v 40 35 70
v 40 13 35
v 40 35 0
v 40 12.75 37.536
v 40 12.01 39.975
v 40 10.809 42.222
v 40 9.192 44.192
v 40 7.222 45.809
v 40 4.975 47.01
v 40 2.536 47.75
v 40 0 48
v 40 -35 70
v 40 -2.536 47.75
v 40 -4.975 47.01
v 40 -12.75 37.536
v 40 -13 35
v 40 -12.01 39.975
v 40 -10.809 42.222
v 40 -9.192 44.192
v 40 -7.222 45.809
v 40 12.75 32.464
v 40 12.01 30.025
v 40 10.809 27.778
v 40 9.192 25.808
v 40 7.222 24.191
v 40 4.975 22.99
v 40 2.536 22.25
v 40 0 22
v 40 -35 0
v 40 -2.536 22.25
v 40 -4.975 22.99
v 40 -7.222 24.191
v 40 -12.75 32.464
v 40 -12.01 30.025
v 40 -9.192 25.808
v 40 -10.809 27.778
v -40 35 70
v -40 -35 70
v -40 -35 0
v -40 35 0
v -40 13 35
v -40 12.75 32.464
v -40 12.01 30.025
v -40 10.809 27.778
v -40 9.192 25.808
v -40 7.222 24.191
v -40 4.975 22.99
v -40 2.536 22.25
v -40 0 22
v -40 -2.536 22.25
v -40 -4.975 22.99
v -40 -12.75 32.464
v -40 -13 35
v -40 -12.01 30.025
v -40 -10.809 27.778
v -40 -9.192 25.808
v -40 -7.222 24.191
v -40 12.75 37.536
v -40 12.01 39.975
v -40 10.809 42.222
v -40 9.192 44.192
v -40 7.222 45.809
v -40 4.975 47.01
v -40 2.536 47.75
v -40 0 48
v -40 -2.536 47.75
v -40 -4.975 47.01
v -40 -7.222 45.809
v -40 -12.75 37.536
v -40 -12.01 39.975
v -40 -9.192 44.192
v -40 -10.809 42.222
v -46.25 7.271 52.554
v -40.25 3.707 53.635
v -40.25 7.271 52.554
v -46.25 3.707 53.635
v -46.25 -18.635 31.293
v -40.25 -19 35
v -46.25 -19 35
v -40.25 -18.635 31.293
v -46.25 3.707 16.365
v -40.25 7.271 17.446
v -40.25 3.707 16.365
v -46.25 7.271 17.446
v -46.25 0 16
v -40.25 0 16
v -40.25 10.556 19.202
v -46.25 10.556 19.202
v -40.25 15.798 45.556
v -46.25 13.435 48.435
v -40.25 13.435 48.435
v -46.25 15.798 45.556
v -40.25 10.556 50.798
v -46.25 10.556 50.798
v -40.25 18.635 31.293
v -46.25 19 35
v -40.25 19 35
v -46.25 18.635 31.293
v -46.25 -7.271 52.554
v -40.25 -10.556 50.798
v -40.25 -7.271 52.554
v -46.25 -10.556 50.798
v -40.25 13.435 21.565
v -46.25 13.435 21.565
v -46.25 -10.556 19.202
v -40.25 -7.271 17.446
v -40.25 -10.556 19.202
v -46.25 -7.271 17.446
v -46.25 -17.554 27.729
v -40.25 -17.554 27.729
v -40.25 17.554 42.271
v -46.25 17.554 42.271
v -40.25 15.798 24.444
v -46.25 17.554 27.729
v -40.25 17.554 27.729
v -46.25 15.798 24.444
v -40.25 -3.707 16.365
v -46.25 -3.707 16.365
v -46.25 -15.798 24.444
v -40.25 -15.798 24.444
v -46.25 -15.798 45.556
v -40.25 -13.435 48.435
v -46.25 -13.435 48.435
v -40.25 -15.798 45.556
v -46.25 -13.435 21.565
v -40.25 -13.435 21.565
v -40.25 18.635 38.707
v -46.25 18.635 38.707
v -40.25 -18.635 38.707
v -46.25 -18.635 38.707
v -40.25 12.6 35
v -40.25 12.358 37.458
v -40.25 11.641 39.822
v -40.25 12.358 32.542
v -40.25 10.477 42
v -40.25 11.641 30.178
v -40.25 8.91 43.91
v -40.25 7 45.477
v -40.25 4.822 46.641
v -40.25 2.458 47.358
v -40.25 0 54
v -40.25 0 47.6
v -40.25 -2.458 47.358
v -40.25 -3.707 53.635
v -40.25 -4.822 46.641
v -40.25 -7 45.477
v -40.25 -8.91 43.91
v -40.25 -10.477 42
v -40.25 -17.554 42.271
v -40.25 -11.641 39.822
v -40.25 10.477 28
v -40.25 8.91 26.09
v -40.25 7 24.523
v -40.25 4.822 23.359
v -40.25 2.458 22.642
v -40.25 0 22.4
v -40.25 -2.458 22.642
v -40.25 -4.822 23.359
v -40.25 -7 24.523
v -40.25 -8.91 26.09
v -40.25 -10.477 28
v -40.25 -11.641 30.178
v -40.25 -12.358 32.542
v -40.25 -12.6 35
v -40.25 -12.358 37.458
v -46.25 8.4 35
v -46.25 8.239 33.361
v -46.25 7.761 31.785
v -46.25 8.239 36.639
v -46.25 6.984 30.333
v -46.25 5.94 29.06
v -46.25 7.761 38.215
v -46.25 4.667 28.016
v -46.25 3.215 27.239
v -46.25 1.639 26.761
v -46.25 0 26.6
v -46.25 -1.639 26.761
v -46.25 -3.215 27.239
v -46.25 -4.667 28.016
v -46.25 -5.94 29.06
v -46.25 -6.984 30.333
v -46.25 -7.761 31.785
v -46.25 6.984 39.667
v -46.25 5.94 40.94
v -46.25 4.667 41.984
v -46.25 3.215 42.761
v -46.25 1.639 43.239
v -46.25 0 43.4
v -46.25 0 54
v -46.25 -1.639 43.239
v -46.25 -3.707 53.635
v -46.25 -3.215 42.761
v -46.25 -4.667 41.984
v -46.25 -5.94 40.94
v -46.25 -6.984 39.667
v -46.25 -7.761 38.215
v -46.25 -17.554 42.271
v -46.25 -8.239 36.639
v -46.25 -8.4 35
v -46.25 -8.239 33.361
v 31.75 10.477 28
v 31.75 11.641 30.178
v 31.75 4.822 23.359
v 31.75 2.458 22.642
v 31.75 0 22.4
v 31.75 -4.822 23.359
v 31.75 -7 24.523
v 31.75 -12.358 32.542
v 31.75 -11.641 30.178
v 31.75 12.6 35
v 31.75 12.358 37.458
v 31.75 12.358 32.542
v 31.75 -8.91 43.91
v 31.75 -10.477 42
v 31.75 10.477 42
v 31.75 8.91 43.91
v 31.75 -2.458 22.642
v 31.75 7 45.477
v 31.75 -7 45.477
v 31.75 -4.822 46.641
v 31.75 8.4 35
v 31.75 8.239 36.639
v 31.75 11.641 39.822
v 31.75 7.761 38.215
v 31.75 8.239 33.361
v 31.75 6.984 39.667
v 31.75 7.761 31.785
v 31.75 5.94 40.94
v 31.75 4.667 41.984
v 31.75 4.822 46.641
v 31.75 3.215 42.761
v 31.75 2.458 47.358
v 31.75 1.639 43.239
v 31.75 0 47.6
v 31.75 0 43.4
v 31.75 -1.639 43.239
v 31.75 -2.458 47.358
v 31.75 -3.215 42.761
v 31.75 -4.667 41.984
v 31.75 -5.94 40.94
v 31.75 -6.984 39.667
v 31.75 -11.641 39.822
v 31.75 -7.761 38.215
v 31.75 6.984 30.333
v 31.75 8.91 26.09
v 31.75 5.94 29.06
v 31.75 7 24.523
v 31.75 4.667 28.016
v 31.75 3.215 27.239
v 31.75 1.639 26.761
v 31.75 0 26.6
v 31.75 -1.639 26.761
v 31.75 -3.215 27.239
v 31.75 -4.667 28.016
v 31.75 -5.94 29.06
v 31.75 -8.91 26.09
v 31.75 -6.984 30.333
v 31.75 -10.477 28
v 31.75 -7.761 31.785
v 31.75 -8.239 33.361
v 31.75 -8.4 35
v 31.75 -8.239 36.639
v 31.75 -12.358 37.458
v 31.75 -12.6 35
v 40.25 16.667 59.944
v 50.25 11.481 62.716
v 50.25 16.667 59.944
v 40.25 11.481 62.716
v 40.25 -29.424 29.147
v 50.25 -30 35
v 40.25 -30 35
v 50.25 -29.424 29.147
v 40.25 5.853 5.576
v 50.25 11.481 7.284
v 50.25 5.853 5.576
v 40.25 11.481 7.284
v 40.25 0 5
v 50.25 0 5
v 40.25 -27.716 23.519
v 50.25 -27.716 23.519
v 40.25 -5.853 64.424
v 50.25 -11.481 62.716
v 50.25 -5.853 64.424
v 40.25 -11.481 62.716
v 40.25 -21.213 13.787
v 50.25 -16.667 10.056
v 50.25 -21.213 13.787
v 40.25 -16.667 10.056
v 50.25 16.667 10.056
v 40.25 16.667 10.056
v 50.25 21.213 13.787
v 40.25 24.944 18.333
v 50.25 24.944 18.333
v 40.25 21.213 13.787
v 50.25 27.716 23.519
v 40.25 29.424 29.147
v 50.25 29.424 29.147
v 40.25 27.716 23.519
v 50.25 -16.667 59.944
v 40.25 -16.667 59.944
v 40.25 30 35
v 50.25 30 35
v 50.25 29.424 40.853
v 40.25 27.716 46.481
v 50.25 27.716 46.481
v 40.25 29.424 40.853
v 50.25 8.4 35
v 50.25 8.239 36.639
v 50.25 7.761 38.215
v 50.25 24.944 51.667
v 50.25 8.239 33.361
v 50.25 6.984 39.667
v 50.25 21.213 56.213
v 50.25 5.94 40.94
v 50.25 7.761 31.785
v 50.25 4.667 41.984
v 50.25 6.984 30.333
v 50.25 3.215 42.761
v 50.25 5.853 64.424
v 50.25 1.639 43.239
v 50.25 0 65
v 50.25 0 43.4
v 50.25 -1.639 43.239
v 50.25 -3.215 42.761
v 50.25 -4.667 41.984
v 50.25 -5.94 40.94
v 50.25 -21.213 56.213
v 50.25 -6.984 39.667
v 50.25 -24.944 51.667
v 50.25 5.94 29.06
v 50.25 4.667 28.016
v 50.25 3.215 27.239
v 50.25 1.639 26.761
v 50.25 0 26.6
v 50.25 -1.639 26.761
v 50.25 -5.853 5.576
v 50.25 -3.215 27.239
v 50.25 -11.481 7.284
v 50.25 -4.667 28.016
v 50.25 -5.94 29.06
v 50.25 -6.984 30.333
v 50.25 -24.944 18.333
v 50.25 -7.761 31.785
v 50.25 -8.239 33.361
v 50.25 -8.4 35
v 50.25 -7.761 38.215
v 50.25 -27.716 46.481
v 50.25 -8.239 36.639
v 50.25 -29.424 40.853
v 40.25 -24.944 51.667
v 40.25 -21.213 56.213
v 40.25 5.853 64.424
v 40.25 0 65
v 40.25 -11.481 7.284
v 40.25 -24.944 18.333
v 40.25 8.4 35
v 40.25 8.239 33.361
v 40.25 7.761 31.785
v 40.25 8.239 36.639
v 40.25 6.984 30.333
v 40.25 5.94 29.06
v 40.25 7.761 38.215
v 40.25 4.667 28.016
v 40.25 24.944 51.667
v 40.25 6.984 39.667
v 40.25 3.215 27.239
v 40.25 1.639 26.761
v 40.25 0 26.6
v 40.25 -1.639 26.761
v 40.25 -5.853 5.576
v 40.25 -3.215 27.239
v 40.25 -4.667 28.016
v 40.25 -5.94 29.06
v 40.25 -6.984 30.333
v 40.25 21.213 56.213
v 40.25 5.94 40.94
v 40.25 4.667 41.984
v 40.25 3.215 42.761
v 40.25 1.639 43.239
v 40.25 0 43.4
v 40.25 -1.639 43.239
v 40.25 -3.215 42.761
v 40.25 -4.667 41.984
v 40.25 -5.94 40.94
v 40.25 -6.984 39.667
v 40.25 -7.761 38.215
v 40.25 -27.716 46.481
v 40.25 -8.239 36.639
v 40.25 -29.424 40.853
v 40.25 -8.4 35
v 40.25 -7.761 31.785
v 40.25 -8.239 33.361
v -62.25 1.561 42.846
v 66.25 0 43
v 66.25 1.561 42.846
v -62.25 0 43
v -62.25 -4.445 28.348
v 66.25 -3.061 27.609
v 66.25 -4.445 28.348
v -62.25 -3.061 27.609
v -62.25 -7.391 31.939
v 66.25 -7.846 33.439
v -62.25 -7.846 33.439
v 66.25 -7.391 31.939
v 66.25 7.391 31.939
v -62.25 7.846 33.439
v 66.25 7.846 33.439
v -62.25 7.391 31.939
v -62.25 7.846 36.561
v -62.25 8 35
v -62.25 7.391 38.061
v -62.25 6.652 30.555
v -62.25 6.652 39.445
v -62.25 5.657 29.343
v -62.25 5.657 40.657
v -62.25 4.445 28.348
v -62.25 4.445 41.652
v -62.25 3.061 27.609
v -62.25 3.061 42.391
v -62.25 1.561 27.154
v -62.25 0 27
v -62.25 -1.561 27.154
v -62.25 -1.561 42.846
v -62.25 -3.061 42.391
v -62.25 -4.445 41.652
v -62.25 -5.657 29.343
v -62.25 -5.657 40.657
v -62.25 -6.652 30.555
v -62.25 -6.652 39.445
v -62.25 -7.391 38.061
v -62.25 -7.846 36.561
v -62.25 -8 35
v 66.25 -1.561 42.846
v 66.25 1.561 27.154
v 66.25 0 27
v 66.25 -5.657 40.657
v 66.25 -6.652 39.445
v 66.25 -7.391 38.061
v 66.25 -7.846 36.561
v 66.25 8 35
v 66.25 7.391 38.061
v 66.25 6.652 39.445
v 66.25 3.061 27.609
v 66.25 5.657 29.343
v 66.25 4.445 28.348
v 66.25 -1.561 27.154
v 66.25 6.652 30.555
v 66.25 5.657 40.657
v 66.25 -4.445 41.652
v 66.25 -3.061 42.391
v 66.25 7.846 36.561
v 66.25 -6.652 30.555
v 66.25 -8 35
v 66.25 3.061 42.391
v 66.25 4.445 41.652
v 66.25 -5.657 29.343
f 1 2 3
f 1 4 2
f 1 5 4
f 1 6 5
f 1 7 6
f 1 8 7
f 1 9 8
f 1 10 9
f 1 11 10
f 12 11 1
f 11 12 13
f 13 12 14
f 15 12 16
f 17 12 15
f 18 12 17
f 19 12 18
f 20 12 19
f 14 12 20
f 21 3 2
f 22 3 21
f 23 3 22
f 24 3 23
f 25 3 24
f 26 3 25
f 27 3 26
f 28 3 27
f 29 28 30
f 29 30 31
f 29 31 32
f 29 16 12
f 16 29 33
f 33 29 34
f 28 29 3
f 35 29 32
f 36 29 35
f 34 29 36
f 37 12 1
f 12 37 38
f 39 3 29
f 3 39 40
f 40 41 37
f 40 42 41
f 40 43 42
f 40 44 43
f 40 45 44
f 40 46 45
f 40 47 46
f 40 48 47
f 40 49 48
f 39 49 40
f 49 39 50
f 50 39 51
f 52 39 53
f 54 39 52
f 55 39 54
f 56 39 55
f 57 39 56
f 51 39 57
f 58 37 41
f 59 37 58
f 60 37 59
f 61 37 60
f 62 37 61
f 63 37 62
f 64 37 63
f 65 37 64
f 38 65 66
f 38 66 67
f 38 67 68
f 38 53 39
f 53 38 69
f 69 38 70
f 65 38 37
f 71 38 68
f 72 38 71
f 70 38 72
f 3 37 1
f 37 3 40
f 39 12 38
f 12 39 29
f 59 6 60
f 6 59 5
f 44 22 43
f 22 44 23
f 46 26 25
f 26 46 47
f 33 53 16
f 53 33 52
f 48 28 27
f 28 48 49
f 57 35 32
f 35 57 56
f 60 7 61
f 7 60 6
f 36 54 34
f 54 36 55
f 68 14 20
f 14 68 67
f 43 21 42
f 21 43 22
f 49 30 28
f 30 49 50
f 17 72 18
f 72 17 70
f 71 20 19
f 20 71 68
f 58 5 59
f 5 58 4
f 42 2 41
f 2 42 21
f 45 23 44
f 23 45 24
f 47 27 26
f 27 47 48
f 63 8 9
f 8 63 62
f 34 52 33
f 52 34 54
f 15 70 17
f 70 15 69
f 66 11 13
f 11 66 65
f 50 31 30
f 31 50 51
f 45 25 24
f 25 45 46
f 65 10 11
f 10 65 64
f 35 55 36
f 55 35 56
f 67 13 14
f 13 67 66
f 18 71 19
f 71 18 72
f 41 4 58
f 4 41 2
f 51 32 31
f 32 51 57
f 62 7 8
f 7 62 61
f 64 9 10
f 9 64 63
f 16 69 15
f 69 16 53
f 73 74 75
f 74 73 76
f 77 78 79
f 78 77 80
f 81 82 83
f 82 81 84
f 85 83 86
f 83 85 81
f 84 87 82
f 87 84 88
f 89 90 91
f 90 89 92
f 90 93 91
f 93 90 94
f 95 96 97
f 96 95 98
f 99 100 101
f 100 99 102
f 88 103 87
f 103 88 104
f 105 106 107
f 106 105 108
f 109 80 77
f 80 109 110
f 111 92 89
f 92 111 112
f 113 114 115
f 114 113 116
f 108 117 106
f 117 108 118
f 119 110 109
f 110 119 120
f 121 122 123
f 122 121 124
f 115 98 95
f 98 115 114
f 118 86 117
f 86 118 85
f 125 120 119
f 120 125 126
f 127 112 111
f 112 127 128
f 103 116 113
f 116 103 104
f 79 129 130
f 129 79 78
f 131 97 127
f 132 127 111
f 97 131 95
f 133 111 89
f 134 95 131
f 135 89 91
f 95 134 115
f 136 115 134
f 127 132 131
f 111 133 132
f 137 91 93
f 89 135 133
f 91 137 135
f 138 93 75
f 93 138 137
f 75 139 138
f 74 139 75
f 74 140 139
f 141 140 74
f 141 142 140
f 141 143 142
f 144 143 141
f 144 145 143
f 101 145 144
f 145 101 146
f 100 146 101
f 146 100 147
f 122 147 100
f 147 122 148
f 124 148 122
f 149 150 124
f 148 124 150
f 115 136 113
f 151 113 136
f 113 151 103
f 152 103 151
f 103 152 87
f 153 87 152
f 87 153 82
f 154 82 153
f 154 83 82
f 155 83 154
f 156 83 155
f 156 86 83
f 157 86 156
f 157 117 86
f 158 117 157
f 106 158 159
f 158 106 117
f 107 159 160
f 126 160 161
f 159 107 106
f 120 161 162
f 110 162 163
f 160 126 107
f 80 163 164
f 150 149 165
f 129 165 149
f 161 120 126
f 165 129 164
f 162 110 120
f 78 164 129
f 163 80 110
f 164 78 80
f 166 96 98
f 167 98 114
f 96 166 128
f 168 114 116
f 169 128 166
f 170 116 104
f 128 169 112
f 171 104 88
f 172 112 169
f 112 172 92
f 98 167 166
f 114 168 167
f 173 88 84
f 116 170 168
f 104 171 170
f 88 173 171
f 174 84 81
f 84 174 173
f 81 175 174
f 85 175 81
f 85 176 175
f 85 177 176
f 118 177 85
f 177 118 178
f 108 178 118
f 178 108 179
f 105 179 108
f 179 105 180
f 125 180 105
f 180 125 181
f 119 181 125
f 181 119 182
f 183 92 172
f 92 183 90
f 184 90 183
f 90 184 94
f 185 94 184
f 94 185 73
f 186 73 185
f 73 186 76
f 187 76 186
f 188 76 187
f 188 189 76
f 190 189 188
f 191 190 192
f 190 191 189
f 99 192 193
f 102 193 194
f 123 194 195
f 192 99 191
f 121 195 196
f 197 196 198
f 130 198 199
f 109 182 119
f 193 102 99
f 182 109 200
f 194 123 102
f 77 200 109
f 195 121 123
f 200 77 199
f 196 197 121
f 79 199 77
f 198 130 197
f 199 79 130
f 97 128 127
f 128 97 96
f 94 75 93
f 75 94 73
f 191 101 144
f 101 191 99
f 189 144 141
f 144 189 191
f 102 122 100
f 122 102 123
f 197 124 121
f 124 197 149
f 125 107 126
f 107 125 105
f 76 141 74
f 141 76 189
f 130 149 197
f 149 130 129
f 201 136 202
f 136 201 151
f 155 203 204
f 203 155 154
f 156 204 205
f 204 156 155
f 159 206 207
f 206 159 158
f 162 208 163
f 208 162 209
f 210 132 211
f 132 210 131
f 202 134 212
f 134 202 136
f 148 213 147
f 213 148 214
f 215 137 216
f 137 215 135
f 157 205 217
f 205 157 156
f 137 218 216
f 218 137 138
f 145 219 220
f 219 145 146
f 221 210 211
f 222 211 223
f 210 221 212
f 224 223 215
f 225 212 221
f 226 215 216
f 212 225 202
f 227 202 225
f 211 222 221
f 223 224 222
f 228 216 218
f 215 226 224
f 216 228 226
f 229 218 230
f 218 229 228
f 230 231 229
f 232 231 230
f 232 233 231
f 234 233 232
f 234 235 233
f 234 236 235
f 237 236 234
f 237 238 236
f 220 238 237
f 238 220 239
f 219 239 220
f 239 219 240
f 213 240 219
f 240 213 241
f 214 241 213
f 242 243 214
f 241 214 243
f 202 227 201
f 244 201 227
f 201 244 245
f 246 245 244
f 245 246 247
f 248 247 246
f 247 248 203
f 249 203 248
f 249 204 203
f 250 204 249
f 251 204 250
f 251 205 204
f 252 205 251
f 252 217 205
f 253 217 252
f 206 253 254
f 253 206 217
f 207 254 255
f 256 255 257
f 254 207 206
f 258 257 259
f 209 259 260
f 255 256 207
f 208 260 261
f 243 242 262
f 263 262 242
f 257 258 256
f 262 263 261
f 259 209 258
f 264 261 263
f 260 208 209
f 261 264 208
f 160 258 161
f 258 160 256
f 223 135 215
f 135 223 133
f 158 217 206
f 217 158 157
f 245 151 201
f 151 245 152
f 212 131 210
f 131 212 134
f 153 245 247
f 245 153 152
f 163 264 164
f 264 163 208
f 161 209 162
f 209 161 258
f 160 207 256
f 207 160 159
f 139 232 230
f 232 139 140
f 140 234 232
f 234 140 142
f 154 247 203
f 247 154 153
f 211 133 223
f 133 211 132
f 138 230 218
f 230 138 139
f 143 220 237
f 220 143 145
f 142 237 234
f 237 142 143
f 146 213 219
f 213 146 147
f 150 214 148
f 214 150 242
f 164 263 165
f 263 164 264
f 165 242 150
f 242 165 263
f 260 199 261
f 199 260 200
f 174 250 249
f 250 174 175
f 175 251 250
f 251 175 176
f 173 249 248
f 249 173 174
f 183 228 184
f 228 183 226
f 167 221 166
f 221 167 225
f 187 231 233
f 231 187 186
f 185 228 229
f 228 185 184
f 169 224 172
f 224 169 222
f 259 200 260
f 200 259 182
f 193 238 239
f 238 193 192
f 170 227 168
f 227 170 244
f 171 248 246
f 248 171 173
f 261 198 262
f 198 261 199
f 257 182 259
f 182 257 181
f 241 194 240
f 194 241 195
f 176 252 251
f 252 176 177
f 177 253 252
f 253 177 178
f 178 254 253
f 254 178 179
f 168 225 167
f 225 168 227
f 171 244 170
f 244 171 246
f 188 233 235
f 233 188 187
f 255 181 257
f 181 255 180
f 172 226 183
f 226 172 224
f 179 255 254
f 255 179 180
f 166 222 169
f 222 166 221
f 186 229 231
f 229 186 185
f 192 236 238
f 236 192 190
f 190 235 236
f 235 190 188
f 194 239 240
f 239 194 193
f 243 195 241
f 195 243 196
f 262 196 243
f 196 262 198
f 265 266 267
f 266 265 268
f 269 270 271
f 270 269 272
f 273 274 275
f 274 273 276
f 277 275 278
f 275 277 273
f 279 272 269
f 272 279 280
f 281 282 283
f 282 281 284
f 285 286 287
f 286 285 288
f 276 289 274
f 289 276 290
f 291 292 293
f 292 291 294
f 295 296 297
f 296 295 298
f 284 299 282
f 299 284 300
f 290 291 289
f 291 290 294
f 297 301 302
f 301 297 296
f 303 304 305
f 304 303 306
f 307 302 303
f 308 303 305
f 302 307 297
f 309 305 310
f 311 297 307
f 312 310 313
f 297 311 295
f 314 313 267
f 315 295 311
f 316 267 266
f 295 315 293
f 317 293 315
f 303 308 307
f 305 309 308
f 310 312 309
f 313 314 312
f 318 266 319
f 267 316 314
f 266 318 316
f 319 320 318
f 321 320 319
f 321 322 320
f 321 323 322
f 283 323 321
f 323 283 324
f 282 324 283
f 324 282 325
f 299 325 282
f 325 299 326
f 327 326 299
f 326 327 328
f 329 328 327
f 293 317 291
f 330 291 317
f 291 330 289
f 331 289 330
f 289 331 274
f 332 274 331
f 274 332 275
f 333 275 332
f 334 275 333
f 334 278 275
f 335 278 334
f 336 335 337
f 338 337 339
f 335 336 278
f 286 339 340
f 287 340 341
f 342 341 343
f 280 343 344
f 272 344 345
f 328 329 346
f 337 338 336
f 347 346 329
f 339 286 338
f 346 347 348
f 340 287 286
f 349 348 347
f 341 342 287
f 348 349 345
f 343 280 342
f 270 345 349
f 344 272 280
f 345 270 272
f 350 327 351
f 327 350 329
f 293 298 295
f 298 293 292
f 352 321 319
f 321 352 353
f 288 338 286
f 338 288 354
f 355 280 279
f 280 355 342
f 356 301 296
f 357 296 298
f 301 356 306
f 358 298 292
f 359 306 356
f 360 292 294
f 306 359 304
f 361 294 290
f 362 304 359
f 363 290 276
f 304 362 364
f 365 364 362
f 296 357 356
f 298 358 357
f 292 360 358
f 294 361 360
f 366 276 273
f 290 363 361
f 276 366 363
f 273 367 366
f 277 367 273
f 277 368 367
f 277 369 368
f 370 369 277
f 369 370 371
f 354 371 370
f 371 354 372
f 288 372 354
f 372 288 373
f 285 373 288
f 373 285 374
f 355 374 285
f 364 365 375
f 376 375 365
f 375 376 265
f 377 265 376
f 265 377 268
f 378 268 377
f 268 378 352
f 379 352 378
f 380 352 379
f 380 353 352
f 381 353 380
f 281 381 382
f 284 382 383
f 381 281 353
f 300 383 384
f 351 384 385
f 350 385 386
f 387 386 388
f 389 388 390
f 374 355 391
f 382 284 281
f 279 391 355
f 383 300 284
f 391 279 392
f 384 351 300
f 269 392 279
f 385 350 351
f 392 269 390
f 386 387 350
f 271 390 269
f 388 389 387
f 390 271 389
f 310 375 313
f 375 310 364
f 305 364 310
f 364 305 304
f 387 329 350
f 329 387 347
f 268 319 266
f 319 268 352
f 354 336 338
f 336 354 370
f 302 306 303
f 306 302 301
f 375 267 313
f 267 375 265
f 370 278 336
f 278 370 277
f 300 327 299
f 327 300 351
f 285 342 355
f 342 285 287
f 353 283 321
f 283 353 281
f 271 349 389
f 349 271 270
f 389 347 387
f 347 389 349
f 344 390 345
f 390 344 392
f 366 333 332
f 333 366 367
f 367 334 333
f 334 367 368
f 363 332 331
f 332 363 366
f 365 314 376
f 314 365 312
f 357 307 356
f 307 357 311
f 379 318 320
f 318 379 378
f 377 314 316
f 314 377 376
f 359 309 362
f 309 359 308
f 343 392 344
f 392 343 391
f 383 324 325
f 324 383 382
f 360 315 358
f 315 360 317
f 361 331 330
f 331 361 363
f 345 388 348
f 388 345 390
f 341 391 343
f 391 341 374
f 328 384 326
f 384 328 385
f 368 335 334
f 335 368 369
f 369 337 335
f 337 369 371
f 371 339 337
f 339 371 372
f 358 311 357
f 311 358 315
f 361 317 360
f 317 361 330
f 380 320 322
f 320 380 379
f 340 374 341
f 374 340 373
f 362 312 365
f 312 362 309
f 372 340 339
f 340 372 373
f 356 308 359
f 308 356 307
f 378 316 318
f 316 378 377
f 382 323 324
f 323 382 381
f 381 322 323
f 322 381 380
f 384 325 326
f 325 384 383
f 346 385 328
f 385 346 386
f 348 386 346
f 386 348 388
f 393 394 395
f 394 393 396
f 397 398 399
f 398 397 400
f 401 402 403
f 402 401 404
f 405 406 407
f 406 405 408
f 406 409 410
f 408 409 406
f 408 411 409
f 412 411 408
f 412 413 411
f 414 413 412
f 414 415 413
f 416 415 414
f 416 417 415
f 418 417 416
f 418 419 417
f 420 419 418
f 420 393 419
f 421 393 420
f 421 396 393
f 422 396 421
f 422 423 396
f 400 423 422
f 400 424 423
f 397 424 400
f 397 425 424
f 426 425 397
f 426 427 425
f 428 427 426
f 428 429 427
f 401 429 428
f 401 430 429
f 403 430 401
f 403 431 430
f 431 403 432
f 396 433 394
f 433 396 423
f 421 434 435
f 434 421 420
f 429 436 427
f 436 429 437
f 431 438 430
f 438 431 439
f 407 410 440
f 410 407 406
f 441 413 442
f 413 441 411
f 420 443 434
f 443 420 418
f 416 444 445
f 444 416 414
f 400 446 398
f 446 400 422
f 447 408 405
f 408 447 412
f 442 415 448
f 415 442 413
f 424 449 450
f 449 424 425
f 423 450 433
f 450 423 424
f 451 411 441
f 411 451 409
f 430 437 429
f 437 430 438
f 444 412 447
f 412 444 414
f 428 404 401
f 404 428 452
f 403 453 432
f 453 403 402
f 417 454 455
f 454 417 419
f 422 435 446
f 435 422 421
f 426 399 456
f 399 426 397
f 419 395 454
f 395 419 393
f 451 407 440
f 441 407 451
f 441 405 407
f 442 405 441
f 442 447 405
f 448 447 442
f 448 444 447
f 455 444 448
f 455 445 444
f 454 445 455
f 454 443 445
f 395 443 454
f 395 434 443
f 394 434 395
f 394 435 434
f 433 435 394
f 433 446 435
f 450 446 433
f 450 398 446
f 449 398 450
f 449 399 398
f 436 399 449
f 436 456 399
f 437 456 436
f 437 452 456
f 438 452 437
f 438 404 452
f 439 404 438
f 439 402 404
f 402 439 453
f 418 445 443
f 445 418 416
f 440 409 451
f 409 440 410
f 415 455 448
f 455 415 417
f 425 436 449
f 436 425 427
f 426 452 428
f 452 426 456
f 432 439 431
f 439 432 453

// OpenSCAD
$fn = 32;

// ------------------------------------------------------------------------
// Bushed housing: 80 x 70 x 70 mm housing, bushing d25.2
// Every part is its own module, assembly() places them once.
// ------------------------------------------------------------------------

// --- part 1 ---
module housing() {
  difference() {
    translate([-40, -35, 0]) cube([80, 70, 70]);
    translate([0, 0, 35]) rotate([0, 90, 0]) cylinder(h = 82, d = 26, center = true);
  }
}

// --- part 2 ---
module bushing() {
  difference() {
    union() {
      cylinder(h = 6, d = 38);
      translate([0, 0, 6]) cylinder(h = 72, d = 25.2);
    }
    translate([0, 0, -1]) cylinder(h = 80, d = 16.8);
  }
}

// --- part 3 ---
module shaft() {
  translate([0, 0, -64.25]) cylinder(h = 128.5, d = 16);
}

// --- part 4 ---
module cover() {
  difference() {
    cylinder(h = 10, d = 60);
    translate([0, 0, -1]) cylinder(h = 12, d = 16.8);
  }
}

// --- assembly ---
module assembly() {
  translate([0, 0, 0]) rotate([0, 0, 0]) housing();
  translate([-46.25, 0, 35]) rotate([0, 90, 0]) bushing();
  translate([2, 0, 35]) rotate([0, 90, 0]) shaft();
  translate([40.25, 0, 35]) rotate([0, 90, 0]) cover();
}

assembly();
